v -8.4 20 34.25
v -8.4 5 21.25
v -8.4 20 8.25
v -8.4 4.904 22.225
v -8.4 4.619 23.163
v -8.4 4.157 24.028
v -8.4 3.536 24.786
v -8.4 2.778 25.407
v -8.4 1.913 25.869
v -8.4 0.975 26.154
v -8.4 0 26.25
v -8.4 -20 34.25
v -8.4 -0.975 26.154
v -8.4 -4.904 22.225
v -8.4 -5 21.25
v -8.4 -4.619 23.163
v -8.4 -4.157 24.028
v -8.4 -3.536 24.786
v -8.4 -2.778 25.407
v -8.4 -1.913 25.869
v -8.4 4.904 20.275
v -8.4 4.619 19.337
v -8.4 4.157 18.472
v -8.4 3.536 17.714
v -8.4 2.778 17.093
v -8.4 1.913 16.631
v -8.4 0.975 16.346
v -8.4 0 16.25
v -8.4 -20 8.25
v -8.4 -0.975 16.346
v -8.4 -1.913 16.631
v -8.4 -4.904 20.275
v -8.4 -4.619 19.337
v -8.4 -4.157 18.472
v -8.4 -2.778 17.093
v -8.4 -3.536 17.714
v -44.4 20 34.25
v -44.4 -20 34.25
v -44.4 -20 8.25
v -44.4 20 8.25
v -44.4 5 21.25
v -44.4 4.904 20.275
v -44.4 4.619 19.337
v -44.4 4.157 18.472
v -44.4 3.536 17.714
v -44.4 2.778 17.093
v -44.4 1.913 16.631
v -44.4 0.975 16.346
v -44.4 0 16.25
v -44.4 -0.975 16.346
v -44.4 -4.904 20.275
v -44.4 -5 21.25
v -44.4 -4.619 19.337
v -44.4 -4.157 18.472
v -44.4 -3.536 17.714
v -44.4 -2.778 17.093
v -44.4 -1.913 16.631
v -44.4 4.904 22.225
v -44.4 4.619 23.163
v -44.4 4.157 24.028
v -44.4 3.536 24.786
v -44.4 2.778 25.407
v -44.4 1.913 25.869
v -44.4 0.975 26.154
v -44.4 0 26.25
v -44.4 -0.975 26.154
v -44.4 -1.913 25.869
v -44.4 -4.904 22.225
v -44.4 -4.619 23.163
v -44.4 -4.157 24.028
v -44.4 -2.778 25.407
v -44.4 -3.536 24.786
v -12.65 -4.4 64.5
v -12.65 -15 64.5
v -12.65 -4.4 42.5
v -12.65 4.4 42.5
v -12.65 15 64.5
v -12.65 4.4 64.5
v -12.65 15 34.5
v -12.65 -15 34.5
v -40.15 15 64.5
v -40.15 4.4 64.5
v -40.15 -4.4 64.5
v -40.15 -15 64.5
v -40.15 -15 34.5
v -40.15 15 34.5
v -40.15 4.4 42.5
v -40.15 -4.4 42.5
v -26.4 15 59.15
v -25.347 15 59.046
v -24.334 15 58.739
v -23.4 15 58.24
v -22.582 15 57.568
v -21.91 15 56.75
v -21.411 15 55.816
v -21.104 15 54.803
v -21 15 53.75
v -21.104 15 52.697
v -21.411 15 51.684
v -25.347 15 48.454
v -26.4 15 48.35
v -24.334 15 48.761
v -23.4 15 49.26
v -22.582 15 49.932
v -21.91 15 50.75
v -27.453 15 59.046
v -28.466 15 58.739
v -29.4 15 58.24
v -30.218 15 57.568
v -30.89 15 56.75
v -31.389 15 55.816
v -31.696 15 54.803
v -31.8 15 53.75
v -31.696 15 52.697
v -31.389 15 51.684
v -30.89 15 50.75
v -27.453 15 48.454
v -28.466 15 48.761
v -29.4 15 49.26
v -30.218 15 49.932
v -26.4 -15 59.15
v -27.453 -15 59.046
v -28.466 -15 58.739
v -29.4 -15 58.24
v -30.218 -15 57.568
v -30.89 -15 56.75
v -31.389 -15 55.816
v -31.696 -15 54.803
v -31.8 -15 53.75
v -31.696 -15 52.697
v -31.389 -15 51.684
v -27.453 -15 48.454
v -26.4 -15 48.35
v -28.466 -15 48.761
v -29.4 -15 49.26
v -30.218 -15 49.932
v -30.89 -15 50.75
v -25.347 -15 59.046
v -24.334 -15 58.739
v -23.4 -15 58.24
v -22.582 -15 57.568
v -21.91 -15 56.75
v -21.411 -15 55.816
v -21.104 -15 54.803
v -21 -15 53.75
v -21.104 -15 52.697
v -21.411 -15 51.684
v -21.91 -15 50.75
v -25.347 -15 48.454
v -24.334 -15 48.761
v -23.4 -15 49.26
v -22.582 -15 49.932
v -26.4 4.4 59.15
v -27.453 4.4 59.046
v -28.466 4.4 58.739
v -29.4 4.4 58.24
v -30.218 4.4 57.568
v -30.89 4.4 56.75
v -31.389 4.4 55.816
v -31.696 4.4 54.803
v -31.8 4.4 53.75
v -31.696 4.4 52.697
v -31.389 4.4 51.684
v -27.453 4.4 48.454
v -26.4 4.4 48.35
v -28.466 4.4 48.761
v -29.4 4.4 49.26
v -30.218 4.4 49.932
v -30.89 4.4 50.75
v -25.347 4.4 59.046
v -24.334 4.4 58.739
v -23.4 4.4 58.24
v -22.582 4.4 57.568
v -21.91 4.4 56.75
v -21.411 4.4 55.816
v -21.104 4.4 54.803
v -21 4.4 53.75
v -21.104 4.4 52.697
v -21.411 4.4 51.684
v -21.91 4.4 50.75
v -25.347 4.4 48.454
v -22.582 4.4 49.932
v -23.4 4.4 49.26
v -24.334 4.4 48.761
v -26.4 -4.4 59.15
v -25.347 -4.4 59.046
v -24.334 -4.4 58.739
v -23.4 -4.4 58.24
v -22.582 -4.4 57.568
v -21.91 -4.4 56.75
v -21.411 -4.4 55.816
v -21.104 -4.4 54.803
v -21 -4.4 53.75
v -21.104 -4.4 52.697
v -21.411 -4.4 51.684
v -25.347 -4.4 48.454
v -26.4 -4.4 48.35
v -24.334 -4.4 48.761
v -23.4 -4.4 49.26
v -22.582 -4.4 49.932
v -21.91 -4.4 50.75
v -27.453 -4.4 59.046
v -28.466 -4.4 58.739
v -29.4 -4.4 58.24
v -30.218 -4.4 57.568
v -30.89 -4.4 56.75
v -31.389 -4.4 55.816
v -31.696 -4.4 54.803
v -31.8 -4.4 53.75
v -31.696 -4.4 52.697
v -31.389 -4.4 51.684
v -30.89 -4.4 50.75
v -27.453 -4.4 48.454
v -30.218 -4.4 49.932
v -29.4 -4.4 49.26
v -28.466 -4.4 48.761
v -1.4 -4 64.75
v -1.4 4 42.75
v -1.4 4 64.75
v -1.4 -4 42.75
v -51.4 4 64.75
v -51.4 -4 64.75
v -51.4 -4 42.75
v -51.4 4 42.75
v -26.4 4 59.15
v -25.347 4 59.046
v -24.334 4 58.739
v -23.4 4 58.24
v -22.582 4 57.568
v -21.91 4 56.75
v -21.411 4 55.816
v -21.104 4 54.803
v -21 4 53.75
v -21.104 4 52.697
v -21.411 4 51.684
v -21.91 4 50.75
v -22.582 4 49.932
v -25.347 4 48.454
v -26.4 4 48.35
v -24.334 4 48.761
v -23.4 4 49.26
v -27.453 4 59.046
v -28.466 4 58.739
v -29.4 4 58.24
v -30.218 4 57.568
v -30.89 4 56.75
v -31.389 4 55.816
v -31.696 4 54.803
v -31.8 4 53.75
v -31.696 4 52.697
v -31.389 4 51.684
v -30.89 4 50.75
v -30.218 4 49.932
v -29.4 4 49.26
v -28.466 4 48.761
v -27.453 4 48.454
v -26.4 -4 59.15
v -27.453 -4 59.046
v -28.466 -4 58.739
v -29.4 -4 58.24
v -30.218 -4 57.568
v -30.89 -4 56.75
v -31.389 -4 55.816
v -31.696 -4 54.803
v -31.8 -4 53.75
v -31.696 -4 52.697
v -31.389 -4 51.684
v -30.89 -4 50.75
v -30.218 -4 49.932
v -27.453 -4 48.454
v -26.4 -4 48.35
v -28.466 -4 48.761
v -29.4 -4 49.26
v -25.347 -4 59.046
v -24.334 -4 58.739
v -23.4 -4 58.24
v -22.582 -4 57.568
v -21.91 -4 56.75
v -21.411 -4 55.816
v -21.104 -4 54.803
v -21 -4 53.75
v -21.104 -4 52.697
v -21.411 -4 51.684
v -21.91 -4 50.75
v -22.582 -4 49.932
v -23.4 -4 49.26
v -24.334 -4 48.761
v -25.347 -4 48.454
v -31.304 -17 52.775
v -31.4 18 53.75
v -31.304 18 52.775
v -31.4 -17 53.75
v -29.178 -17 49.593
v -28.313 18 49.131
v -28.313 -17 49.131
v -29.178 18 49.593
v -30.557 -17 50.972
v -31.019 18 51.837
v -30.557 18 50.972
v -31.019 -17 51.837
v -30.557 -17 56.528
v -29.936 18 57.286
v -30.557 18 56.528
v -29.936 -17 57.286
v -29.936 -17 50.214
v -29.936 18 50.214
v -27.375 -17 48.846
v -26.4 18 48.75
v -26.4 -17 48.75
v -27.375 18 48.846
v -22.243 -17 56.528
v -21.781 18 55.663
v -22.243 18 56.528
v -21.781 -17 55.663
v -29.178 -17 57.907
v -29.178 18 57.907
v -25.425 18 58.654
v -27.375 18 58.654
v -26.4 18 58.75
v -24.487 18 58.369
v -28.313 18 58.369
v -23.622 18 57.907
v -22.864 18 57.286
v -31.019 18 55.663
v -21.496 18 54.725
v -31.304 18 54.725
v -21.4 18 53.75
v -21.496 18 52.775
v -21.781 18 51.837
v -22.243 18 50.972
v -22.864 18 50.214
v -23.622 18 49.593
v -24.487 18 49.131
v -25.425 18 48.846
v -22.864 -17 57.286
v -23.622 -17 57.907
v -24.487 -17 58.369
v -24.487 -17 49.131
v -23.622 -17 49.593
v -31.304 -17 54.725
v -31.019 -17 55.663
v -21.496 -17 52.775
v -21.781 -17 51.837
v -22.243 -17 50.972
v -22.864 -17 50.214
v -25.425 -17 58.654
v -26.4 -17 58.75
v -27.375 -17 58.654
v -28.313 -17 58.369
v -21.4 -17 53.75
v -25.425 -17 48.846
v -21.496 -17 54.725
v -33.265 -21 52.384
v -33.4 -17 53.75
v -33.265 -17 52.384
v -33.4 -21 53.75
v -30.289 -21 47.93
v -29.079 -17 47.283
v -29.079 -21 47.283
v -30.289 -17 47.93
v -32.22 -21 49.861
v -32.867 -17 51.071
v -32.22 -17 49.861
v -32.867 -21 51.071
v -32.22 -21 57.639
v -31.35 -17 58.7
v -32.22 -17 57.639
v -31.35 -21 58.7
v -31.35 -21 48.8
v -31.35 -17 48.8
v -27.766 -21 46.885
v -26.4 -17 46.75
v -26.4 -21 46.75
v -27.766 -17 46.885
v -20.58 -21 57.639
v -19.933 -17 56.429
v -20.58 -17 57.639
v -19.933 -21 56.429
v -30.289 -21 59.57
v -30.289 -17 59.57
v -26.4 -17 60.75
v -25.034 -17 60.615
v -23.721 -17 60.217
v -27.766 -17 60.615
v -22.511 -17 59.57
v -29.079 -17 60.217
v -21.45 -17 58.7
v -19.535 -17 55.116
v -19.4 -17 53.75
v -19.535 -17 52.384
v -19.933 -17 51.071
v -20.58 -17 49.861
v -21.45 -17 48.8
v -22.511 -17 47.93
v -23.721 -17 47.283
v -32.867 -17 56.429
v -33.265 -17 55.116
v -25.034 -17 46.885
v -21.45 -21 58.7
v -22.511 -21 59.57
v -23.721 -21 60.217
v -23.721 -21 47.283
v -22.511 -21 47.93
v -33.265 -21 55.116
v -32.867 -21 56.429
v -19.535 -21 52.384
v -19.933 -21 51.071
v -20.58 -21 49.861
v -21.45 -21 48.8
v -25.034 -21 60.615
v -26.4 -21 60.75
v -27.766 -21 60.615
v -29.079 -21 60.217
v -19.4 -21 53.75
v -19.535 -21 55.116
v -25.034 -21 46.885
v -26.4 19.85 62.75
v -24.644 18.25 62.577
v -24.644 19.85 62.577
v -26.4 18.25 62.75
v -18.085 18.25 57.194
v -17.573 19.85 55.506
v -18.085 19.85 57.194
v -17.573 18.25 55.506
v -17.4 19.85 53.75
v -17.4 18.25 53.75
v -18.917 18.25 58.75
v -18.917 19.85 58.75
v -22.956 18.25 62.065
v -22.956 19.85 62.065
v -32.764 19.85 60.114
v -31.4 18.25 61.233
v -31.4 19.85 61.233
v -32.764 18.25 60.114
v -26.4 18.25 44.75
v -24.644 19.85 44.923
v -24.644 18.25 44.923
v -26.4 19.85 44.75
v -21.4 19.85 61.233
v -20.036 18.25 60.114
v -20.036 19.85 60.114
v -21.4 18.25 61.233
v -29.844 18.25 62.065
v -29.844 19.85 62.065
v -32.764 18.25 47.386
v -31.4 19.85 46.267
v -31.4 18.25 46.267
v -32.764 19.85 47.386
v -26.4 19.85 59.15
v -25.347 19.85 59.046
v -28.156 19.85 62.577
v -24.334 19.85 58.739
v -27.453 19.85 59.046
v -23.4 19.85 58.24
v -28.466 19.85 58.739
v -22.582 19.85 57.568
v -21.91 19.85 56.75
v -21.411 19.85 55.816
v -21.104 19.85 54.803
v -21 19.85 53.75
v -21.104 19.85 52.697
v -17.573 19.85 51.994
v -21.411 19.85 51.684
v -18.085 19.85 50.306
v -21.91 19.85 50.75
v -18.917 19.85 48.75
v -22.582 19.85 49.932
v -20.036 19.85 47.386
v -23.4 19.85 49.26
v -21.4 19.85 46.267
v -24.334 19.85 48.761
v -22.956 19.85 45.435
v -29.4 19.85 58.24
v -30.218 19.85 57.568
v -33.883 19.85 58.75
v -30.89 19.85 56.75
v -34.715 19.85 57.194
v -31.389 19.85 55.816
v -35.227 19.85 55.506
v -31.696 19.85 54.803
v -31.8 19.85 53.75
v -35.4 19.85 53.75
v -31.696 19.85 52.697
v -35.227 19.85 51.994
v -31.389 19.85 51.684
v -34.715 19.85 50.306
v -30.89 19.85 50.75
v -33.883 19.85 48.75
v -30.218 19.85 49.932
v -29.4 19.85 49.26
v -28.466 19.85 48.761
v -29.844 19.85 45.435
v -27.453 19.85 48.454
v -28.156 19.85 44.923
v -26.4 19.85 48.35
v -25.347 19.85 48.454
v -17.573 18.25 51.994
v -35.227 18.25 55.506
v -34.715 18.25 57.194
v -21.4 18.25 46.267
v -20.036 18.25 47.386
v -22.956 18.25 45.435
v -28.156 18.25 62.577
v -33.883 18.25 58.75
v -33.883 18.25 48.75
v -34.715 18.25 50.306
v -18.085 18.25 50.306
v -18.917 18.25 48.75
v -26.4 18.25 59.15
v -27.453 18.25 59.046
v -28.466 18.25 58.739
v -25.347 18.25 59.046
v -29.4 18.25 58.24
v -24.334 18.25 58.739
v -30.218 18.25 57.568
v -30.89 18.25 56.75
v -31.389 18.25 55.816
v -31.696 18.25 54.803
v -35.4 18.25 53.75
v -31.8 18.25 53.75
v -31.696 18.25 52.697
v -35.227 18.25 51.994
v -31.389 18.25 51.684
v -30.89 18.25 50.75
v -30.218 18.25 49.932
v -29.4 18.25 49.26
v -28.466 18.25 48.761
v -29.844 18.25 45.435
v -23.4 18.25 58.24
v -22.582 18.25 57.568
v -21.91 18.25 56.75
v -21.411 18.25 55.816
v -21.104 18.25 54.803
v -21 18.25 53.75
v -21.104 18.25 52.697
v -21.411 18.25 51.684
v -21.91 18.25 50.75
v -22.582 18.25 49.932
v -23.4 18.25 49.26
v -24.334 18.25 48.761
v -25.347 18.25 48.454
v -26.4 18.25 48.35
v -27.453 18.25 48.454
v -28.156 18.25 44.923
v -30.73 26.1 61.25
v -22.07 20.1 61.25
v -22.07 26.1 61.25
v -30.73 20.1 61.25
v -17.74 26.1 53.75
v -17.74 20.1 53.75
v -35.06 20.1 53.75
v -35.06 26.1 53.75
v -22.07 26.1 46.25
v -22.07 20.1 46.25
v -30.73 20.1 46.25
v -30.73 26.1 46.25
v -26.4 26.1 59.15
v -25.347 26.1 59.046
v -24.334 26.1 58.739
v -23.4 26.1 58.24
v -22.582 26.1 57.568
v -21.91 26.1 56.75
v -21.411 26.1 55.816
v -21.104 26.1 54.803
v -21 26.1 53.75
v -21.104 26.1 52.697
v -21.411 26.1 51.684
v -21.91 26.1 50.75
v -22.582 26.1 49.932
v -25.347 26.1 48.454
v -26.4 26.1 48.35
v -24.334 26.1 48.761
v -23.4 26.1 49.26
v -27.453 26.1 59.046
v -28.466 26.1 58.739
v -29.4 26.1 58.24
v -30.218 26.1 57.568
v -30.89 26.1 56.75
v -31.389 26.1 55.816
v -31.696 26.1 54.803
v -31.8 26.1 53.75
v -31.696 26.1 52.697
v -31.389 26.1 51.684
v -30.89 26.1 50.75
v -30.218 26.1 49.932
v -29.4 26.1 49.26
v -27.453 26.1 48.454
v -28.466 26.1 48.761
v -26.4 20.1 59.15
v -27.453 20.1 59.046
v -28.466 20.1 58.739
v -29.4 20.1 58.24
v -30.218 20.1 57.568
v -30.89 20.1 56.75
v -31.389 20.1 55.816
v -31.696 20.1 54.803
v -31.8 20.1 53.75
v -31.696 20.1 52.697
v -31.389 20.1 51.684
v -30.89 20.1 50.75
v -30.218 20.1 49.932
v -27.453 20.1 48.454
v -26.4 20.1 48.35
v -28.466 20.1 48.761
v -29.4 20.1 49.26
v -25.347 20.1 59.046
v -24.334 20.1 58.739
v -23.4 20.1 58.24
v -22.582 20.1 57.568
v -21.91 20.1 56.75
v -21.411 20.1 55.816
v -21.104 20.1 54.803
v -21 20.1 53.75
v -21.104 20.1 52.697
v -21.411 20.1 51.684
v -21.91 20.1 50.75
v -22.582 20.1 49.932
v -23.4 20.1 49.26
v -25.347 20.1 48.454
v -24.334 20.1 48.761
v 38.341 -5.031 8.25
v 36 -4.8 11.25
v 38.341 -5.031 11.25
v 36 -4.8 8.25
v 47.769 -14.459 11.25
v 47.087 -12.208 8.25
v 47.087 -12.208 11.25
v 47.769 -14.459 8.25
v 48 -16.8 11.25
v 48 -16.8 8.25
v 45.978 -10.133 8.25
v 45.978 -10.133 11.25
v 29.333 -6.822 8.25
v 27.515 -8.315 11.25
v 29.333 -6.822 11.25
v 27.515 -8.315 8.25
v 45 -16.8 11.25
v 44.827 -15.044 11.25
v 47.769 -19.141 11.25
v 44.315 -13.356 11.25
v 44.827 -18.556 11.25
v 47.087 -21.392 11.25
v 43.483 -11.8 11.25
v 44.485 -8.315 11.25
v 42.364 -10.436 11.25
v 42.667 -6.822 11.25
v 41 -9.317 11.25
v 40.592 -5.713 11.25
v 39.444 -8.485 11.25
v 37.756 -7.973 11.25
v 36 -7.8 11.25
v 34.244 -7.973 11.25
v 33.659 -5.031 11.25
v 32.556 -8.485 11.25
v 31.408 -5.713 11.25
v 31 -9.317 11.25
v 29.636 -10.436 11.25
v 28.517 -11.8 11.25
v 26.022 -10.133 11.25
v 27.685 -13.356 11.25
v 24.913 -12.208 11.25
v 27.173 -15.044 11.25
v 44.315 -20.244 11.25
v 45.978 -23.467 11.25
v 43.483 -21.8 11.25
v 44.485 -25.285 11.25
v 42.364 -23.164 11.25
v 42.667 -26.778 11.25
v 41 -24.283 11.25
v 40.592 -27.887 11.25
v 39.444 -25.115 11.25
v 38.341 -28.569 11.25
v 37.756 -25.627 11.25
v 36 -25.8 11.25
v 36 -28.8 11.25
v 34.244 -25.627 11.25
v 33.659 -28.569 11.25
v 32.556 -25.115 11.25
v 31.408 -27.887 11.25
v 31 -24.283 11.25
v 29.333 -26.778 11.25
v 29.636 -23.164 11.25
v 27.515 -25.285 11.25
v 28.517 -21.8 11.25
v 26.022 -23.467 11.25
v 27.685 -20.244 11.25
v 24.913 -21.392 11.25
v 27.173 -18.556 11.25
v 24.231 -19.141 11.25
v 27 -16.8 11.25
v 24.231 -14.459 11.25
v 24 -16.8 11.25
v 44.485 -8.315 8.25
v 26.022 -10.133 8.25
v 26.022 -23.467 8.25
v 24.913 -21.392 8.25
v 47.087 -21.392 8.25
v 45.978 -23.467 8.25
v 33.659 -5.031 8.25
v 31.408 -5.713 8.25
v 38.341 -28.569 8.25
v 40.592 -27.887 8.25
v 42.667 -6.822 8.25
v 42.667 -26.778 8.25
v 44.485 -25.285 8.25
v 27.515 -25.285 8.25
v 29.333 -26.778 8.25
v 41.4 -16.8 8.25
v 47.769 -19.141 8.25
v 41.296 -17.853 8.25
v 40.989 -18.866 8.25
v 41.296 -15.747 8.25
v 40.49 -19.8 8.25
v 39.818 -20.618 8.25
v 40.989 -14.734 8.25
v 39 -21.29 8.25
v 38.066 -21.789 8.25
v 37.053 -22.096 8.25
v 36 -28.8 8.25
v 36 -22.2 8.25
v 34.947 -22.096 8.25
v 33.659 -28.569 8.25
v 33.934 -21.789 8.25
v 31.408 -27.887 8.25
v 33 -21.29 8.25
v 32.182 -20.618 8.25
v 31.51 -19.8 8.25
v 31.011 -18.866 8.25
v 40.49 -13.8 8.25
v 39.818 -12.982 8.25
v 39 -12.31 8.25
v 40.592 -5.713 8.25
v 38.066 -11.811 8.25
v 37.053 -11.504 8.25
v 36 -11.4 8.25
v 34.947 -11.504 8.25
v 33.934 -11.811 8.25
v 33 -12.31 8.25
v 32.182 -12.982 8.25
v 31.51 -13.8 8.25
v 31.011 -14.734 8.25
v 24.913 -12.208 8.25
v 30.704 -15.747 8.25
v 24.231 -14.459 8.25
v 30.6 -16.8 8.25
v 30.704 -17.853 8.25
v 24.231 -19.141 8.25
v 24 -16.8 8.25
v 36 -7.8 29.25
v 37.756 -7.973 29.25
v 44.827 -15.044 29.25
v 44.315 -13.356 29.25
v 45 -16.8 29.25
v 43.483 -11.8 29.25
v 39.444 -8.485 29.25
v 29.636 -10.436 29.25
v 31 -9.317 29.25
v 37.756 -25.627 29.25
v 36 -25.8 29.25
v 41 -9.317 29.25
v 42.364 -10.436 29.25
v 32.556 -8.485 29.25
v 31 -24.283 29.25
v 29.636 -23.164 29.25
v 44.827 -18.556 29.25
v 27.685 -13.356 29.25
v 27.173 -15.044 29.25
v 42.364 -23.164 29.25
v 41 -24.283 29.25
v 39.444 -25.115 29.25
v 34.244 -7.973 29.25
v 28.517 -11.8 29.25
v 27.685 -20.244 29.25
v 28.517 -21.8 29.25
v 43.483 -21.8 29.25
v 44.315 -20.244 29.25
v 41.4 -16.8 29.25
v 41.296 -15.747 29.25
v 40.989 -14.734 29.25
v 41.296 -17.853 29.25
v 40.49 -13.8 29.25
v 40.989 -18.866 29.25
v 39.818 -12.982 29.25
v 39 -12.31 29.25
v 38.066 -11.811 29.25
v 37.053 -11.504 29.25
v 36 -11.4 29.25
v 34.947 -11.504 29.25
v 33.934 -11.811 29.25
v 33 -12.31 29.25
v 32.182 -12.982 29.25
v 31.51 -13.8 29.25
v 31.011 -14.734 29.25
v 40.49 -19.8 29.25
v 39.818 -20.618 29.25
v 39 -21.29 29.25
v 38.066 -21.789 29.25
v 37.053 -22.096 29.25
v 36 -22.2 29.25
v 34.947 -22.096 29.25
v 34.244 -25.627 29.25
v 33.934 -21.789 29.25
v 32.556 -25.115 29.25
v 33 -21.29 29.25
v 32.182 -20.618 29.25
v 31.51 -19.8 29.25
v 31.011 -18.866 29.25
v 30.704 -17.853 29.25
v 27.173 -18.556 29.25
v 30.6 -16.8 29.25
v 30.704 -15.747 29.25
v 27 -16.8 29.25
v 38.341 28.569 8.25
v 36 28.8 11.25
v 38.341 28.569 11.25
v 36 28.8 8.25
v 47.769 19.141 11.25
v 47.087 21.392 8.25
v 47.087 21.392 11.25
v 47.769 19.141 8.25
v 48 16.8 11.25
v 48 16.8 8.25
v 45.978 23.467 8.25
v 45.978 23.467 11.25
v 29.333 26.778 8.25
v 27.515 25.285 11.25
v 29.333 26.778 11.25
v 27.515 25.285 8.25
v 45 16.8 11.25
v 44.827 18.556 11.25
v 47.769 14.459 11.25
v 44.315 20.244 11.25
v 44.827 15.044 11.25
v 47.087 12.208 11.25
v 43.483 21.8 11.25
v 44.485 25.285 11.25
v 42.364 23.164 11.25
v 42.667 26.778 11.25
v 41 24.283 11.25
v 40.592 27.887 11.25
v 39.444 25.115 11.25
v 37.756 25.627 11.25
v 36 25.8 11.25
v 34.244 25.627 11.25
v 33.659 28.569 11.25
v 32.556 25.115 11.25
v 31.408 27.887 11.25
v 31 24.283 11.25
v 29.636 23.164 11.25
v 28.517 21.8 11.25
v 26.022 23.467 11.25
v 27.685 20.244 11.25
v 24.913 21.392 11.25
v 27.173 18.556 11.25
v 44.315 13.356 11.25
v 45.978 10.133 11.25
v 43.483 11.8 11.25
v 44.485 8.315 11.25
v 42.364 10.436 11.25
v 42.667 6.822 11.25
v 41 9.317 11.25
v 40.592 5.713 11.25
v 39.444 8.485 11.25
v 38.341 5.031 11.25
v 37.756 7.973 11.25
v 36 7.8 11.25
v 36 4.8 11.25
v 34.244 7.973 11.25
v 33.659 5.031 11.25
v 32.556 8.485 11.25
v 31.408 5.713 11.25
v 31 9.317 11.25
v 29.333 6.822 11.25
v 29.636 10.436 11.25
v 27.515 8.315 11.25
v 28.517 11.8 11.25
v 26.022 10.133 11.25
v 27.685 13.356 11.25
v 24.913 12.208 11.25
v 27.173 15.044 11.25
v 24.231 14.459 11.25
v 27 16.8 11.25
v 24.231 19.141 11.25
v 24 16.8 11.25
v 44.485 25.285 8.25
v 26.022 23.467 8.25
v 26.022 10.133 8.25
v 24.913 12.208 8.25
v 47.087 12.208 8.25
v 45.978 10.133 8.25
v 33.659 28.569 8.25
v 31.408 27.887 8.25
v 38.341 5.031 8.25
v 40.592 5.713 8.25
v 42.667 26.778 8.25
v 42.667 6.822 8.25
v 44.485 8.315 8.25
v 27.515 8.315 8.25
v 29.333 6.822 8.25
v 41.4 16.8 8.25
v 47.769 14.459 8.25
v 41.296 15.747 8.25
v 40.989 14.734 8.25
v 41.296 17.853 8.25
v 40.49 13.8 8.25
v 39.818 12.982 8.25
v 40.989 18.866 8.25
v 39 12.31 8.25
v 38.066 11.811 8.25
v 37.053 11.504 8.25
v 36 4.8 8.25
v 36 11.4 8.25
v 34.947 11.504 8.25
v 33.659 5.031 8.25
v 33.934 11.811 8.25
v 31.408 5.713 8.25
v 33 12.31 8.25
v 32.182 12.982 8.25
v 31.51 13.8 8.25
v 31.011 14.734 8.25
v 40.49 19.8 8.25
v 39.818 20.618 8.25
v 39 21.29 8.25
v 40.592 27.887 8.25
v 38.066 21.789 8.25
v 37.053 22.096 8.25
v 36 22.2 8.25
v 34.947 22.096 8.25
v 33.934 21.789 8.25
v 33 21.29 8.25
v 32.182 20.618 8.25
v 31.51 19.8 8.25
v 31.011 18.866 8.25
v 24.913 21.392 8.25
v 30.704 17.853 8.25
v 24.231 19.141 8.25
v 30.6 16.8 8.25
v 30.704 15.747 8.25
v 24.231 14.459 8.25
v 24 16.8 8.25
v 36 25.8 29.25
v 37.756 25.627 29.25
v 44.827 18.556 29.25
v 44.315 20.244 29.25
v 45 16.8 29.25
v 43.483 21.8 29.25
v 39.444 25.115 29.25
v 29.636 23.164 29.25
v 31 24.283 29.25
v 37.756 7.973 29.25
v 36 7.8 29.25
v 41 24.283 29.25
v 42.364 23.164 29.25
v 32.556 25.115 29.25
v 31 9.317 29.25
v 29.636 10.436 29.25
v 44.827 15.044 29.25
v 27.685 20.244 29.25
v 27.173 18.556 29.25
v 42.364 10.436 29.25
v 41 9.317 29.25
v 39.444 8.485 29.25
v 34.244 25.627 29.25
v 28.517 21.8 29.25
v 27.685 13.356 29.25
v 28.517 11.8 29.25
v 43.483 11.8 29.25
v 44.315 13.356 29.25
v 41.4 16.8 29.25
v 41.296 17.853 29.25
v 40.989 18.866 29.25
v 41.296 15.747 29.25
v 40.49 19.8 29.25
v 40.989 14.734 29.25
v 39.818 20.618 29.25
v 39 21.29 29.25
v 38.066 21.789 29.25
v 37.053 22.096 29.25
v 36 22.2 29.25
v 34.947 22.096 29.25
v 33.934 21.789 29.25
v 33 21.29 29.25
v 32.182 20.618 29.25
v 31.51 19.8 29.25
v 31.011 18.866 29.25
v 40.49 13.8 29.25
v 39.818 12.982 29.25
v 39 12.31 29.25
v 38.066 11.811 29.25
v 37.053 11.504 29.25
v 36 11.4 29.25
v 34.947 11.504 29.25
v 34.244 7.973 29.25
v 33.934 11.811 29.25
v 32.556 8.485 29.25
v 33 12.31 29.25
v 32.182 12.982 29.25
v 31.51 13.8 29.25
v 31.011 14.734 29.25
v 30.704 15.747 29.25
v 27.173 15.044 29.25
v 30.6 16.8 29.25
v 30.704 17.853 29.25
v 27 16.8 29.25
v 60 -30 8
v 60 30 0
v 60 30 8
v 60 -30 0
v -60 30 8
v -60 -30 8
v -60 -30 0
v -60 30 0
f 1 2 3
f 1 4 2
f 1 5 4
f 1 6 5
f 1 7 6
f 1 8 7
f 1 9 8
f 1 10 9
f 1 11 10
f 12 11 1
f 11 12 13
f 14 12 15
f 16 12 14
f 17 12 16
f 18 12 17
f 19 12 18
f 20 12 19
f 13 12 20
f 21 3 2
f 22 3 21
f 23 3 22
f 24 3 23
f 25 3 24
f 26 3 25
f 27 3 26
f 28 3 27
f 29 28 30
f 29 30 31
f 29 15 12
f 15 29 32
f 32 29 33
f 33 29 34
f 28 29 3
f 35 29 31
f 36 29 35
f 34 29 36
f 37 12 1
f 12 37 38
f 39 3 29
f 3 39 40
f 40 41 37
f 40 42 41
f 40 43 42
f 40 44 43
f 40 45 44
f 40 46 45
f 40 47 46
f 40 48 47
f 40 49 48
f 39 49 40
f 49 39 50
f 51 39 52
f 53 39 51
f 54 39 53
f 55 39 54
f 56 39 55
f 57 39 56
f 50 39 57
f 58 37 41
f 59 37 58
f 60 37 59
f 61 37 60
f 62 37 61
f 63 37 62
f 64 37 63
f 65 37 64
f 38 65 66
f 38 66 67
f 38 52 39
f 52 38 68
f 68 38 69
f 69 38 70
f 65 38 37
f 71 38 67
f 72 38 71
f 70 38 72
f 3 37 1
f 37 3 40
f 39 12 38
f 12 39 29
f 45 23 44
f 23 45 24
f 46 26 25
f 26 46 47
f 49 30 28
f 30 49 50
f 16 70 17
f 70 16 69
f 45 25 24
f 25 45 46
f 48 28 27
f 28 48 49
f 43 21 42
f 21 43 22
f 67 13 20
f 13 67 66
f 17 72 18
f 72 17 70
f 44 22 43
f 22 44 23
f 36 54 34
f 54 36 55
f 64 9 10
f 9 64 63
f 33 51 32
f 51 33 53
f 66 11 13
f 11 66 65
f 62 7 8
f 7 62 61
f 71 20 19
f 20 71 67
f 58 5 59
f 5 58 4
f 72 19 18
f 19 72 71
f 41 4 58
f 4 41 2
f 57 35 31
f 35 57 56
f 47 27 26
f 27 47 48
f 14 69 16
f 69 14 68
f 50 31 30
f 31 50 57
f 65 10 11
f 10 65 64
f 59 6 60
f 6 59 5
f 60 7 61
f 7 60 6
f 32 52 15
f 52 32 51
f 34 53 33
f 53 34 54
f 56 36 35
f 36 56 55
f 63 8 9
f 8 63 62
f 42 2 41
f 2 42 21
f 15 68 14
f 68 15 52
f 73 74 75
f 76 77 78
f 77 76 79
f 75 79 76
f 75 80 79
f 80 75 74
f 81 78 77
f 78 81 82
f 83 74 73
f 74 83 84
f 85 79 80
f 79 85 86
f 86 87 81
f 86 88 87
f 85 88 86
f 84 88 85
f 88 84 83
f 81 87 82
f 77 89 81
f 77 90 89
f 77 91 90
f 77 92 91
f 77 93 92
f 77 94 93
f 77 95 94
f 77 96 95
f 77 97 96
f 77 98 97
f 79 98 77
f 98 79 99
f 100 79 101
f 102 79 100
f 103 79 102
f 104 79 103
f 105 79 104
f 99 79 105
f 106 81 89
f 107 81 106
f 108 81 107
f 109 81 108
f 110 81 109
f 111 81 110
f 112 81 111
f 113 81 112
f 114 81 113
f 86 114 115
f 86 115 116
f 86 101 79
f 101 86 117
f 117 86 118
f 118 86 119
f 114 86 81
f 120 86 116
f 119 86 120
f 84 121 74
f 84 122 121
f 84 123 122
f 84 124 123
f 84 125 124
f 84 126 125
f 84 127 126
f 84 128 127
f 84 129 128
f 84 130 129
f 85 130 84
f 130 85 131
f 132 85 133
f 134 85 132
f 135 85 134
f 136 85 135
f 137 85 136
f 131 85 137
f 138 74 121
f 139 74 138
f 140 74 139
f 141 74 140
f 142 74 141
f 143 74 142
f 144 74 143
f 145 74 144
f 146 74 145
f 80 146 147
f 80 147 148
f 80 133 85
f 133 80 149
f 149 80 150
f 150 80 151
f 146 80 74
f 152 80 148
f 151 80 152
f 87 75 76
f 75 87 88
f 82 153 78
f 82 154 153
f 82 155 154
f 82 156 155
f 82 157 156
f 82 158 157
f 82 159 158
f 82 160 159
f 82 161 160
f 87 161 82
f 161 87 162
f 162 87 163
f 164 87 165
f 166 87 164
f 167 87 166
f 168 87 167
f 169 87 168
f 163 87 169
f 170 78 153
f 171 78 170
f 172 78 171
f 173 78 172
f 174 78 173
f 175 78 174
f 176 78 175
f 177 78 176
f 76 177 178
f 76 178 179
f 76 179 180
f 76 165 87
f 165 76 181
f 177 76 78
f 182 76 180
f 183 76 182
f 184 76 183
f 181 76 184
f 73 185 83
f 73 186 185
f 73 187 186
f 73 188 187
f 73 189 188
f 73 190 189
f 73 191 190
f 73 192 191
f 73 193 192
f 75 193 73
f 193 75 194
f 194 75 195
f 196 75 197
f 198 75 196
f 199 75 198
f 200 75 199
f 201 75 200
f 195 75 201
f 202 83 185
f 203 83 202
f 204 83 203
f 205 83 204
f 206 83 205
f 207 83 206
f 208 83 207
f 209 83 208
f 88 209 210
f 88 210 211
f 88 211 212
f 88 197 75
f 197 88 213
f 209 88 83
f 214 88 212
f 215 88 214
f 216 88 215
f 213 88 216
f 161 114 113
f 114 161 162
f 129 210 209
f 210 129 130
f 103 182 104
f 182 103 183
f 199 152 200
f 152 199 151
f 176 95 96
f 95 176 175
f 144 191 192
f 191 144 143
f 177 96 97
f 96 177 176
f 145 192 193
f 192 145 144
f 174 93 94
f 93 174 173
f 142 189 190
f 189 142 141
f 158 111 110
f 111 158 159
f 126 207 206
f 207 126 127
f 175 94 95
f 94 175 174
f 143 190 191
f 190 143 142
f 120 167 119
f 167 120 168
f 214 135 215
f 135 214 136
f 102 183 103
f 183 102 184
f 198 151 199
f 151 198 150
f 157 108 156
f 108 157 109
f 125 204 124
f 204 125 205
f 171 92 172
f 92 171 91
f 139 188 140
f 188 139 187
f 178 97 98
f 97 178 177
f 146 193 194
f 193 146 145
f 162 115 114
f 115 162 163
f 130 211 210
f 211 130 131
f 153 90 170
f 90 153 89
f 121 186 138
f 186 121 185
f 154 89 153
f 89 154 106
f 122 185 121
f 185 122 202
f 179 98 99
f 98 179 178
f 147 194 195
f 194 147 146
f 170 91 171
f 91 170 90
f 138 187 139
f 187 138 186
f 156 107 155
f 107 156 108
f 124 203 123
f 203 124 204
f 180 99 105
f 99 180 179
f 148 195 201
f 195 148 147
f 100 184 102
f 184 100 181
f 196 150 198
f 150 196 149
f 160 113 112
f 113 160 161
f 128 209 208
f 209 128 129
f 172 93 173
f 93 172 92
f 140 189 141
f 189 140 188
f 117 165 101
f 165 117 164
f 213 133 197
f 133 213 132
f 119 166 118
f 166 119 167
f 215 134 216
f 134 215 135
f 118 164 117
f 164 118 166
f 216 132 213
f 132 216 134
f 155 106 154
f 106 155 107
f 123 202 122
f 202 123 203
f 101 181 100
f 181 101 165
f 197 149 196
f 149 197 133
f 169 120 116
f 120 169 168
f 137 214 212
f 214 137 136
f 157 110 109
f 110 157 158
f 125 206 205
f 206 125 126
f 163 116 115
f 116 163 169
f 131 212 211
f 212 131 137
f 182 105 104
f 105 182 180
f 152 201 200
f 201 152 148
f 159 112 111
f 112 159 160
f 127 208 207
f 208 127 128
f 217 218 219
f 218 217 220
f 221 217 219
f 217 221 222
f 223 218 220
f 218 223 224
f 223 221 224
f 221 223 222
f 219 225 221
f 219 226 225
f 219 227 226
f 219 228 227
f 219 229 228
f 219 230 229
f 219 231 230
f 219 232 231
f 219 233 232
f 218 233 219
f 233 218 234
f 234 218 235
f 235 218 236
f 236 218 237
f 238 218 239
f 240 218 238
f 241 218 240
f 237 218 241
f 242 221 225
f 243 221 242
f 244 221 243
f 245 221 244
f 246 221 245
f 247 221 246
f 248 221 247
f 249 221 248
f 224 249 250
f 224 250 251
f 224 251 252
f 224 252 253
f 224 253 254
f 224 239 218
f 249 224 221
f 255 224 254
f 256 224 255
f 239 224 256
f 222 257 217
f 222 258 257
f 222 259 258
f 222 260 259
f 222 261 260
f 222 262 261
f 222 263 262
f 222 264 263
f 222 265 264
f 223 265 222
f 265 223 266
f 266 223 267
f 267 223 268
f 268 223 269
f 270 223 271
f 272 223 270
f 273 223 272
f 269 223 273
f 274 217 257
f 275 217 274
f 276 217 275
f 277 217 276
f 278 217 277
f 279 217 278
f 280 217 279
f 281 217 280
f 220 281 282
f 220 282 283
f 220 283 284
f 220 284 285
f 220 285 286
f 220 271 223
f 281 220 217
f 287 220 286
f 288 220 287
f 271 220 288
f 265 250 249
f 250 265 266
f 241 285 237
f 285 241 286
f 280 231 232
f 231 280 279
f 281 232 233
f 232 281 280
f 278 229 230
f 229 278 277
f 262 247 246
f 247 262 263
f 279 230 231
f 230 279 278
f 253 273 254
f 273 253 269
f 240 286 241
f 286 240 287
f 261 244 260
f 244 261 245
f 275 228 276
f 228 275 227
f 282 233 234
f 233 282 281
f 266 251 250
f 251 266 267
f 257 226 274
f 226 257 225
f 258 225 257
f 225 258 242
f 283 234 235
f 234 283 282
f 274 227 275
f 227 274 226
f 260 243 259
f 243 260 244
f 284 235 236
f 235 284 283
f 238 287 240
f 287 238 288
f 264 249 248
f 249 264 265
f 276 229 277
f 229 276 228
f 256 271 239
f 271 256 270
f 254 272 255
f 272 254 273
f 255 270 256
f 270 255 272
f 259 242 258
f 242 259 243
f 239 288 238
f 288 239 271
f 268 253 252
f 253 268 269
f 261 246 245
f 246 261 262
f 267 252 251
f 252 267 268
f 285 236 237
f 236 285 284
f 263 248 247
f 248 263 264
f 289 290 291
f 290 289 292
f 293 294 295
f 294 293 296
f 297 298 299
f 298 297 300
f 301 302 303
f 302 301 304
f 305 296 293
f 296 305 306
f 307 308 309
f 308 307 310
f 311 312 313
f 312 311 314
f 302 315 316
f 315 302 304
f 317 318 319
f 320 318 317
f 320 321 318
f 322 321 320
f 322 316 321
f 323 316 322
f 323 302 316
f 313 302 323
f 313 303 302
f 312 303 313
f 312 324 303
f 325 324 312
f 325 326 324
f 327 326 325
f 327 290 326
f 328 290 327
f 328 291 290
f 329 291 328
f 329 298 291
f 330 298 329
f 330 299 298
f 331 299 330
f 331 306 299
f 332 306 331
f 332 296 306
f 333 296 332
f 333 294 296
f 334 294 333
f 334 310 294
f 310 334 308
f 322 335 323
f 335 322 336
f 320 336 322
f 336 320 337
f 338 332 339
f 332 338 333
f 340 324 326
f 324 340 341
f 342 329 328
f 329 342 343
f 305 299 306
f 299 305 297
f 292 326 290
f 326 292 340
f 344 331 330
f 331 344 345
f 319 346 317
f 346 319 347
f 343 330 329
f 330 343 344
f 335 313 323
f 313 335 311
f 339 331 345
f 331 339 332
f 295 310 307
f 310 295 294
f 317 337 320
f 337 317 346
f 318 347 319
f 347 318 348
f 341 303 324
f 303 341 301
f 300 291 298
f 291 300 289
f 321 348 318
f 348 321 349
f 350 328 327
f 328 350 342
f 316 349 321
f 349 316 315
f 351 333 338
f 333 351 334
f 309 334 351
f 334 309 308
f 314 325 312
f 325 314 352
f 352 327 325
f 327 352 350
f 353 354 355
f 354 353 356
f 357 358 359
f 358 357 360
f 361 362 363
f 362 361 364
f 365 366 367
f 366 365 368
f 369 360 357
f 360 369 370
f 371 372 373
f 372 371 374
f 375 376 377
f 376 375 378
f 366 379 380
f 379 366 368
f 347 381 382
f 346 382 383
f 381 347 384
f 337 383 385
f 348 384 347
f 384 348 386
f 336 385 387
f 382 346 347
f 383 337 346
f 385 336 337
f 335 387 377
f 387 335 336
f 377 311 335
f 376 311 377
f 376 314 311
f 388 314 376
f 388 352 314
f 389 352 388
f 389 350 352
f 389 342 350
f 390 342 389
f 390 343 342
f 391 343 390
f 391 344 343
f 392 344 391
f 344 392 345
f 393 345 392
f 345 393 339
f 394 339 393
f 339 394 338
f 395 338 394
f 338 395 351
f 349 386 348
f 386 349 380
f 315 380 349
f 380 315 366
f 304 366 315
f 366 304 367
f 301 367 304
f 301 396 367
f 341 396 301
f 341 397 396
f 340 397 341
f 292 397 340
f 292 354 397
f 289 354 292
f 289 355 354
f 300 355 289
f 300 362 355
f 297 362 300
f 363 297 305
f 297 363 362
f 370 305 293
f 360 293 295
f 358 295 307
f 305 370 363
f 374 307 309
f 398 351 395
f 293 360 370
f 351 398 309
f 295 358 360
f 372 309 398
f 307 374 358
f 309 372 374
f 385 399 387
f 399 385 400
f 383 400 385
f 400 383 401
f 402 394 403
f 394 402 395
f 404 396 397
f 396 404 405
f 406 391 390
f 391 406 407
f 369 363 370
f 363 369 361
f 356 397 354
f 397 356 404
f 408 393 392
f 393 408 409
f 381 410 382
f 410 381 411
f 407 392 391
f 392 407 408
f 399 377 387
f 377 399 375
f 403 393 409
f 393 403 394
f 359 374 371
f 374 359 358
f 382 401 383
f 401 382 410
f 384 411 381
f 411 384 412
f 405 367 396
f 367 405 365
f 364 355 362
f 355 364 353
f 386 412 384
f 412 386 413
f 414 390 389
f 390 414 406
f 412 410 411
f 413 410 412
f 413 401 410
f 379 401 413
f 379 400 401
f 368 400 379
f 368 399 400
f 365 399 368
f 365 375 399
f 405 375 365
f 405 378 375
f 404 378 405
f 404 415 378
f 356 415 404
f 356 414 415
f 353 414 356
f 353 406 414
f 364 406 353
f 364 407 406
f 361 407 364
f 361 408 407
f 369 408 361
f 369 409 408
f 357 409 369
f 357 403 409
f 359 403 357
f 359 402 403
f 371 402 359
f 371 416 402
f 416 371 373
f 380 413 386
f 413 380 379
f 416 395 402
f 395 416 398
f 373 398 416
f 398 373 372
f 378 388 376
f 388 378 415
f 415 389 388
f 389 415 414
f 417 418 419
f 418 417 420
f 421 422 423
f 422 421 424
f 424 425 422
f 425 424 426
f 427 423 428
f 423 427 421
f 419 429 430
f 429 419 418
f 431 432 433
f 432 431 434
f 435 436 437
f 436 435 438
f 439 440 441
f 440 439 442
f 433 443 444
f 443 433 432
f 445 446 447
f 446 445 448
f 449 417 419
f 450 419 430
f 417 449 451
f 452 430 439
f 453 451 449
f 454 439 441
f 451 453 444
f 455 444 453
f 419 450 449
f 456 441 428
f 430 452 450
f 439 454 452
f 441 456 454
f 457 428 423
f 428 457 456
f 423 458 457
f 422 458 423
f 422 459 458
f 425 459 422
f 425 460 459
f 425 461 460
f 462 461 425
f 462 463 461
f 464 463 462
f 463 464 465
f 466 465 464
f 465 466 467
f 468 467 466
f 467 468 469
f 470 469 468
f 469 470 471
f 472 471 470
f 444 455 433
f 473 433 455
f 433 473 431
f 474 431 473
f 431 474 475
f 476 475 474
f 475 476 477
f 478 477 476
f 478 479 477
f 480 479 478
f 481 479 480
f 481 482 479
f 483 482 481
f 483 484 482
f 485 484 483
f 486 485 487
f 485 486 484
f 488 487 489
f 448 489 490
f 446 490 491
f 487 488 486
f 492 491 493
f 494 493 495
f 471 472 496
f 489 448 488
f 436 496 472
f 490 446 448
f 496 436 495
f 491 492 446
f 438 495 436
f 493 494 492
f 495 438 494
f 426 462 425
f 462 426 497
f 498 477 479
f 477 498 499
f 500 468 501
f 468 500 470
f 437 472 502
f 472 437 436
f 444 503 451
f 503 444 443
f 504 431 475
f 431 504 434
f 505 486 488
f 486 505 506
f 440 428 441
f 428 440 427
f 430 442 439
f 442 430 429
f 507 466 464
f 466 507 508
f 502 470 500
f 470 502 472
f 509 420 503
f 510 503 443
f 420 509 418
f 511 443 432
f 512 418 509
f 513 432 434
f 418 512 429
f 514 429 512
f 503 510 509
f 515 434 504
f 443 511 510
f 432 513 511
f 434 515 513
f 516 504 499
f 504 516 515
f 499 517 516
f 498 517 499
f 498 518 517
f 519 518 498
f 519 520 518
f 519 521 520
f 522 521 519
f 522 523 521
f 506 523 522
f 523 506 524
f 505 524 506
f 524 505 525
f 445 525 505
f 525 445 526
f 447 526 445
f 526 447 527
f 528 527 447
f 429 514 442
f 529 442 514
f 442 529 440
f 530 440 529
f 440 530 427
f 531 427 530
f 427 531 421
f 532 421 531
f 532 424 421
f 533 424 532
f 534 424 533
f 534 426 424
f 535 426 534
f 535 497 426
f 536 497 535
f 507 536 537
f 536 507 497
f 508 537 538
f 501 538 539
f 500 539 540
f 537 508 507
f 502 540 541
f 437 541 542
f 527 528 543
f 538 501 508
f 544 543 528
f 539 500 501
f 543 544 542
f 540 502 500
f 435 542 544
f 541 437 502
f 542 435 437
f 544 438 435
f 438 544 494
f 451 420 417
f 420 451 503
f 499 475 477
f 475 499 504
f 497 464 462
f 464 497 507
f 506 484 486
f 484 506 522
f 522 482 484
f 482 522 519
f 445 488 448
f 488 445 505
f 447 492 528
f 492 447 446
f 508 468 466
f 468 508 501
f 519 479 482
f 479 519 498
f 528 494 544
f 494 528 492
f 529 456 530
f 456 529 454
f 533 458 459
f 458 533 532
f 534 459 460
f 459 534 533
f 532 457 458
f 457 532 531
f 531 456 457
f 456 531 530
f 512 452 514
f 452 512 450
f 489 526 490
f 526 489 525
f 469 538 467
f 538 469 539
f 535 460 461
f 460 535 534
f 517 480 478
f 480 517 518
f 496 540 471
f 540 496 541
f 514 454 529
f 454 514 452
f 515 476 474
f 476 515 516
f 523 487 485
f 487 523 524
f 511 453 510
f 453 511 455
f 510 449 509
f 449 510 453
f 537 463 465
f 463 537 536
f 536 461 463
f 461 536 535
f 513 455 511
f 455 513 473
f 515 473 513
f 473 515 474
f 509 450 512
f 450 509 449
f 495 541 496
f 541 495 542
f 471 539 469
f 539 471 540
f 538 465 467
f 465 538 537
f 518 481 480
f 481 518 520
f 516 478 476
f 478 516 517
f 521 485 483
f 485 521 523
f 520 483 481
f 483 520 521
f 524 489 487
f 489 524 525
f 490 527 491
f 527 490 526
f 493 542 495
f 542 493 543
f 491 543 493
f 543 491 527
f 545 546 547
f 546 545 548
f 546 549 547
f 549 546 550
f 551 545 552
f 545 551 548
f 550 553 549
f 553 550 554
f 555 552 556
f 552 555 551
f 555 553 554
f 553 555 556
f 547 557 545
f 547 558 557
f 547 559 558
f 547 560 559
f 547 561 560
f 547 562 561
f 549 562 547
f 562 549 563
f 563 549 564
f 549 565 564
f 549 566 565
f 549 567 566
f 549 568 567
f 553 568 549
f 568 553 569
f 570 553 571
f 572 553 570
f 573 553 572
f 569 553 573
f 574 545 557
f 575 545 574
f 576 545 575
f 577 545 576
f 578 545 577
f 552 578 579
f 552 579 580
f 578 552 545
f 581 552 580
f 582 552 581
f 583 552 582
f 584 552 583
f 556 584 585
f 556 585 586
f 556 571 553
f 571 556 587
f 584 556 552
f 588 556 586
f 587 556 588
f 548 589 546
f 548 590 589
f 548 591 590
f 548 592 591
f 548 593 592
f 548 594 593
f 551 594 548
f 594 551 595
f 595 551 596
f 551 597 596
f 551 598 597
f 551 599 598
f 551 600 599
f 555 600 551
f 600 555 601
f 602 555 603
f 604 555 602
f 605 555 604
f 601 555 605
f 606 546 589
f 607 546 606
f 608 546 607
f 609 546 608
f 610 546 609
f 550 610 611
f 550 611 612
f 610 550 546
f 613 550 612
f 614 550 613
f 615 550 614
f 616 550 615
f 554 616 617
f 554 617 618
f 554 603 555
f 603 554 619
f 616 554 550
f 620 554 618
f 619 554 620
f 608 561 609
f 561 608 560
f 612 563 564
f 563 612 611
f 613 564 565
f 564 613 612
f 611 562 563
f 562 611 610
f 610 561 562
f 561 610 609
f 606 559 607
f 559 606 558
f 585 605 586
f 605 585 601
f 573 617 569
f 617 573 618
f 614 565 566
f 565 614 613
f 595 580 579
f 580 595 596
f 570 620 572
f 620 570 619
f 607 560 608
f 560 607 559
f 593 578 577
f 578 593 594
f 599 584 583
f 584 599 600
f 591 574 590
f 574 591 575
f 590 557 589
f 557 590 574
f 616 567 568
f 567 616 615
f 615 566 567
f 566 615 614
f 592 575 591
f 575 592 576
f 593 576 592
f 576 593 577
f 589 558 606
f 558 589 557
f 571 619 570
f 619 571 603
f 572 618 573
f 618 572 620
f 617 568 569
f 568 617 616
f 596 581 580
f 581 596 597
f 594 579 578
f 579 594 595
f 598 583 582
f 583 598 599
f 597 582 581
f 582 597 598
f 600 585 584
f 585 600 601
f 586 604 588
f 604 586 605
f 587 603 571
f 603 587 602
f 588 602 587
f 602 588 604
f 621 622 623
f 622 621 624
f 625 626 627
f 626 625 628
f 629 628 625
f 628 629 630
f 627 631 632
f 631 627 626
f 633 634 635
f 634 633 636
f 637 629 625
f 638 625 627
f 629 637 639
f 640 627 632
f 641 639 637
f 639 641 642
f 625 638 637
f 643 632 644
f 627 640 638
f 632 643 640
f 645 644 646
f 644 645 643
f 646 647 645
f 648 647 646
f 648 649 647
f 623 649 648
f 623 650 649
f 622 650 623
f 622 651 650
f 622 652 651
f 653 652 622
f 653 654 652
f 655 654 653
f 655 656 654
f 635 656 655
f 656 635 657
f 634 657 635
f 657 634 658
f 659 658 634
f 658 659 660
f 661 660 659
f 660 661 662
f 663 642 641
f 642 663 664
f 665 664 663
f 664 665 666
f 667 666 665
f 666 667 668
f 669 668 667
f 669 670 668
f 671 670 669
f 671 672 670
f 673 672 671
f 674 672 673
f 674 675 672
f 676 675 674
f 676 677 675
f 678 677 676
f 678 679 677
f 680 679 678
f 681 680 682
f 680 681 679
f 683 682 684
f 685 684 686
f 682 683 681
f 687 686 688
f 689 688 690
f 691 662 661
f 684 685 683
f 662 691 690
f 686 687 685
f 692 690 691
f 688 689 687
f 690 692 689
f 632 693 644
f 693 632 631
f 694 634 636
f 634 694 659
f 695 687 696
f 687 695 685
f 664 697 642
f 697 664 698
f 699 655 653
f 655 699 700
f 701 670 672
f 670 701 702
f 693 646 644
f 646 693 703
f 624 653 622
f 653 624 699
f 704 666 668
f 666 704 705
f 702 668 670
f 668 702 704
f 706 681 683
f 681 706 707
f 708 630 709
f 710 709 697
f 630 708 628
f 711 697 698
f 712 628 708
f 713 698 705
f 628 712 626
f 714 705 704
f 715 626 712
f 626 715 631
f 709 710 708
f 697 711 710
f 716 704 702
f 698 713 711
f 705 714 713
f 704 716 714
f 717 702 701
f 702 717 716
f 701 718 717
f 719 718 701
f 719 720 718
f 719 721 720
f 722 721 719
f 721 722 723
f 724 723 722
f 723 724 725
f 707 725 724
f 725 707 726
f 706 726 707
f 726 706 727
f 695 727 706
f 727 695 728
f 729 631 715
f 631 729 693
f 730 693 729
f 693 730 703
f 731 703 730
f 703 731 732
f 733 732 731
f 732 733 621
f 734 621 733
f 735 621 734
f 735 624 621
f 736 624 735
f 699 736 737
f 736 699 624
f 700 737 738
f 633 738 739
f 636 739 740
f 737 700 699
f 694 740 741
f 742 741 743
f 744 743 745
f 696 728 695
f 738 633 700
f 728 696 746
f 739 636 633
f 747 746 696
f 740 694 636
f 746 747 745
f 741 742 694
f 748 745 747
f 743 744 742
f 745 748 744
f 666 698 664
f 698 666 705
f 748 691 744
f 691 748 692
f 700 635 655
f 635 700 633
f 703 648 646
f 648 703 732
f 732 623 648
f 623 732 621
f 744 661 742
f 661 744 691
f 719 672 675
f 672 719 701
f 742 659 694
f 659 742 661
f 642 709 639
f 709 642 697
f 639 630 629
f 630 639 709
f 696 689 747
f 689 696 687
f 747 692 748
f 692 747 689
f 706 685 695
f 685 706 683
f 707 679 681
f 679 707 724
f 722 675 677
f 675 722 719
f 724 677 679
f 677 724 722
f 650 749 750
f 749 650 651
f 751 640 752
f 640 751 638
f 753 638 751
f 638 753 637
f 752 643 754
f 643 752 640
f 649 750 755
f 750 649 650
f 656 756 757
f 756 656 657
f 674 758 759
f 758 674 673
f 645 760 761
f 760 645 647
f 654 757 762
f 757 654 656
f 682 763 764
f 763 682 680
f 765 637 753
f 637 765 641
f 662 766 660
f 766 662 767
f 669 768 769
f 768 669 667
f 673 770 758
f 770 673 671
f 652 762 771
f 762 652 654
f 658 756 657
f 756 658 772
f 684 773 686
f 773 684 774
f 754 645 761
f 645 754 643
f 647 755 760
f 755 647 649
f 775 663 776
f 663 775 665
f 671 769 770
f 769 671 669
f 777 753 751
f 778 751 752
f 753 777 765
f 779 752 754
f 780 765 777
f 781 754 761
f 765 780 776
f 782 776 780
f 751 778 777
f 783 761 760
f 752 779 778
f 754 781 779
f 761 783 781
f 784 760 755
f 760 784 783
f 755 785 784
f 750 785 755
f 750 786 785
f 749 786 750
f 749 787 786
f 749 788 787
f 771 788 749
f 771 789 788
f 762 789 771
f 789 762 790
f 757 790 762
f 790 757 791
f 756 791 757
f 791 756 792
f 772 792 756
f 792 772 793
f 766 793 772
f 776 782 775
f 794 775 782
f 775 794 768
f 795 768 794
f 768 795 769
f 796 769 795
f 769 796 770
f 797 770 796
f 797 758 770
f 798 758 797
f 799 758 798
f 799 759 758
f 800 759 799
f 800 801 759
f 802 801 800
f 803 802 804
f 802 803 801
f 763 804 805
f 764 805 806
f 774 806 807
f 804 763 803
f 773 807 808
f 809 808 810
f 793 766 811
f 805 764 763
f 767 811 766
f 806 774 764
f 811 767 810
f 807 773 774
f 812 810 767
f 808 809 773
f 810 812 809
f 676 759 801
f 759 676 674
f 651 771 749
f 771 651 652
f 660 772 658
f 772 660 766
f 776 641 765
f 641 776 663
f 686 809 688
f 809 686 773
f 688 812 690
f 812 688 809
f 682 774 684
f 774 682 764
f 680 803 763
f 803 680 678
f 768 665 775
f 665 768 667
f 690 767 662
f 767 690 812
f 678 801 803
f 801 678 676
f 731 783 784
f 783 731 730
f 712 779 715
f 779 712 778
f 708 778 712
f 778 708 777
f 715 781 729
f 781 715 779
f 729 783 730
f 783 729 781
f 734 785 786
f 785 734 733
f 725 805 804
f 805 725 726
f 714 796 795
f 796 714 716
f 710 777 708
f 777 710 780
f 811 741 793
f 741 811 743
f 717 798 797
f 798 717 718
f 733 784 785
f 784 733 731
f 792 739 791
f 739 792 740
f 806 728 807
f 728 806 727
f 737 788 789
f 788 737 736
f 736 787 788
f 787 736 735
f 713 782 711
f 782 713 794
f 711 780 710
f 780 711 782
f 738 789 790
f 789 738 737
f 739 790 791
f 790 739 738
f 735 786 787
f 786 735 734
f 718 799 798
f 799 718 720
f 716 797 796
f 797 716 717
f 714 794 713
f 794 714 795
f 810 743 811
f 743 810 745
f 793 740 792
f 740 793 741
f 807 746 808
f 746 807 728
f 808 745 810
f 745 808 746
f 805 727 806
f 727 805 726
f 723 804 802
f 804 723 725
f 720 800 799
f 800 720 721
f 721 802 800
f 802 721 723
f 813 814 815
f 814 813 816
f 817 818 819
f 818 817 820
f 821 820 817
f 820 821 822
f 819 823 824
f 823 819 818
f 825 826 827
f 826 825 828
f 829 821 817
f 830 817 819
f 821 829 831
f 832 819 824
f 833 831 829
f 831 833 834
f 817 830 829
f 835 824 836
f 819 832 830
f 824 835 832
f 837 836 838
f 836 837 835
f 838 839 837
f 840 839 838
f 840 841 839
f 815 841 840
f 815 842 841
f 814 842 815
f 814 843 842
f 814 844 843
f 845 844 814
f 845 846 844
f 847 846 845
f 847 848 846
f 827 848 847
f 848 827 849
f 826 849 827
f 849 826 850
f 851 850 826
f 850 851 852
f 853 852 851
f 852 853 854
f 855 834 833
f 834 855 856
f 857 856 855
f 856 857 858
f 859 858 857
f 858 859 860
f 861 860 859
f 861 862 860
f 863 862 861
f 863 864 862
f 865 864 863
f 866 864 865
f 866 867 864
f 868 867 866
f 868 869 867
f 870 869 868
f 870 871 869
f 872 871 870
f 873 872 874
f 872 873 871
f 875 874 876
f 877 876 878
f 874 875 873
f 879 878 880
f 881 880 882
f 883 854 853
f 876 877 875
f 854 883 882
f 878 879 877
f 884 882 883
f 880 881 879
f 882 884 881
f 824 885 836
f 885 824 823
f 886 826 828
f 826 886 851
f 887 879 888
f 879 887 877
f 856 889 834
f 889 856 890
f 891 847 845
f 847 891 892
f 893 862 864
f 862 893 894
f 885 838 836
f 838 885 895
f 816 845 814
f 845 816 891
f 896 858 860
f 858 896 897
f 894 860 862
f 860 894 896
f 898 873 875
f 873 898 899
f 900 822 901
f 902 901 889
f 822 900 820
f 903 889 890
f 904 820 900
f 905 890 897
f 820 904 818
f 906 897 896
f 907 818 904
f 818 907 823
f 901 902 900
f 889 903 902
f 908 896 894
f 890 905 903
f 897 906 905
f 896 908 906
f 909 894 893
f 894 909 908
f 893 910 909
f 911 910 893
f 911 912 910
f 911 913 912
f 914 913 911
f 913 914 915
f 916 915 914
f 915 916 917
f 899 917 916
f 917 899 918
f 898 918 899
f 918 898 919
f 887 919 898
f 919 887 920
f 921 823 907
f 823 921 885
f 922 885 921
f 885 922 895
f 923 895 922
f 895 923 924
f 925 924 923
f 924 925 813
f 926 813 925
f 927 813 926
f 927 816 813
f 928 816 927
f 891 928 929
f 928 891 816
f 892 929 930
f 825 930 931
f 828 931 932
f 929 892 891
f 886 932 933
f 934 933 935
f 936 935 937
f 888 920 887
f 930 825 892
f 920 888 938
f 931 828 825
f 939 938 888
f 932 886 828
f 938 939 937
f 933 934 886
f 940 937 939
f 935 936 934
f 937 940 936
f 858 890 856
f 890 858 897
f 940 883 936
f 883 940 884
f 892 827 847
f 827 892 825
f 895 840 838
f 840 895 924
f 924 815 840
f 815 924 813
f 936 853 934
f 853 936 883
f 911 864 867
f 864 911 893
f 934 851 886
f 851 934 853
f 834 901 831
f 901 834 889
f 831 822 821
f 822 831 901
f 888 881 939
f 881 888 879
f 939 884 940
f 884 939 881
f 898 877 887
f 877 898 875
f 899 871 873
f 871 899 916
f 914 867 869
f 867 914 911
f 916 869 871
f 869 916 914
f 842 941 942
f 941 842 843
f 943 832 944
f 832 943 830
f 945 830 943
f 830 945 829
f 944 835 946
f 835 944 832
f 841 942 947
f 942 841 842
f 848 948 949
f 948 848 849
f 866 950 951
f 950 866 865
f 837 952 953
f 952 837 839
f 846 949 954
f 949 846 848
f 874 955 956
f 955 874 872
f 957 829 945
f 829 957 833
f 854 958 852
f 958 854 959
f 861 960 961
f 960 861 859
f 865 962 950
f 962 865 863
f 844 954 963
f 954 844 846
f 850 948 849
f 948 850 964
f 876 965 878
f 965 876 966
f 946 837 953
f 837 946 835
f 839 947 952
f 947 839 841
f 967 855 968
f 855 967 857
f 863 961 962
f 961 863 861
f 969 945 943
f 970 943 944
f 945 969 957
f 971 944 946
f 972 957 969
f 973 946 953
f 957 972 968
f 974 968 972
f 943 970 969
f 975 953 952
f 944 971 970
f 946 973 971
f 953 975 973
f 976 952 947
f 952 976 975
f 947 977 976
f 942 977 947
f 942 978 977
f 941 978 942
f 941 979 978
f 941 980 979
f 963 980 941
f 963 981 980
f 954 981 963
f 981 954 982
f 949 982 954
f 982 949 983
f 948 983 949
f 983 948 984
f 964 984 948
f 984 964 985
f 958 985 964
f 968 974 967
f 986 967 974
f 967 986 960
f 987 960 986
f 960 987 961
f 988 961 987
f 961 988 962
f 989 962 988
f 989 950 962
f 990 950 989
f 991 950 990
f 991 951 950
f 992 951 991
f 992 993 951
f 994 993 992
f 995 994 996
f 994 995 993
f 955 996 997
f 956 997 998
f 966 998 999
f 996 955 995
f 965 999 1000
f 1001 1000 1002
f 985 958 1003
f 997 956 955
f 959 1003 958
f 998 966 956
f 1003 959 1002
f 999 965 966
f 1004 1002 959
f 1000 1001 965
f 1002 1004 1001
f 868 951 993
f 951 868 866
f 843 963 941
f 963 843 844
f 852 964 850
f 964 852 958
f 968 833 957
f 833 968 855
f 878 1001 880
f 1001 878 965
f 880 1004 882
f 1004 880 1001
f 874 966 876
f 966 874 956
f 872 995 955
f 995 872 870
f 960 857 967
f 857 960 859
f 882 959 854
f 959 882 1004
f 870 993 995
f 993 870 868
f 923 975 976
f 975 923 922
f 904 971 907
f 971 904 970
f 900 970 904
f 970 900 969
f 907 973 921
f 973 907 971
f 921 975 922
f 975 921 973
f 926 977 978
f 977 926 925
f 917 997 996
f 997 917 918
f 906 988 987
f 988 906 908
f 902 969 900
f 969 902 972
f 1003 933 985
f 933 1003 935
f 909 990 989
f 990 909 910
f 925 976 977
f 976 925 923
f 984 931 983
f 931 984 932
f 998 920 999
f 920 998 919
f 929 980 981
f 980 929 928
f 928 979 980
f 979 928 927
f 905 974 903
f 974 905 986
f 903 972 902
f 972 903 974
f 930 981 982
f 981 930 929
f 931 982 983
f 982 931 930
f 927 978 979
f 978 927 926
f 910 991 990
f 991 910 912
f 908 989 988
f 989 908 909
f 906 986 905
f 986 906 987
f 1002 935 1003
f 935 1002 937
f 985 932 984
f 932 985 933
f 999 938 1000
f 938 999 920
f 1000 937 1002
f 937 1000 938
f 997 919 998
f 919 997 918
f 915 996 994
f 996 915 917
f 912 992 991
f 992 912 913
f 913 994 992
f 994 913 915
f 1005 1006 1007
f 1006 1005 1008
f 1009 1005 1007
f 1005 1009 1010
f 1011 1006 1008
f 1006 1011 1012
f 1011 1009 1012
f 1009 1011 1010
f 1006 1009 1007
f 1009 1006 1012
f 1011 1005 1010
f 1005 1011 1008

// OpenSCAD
$fn = 32;

// ------------------------------------------------------------------------
// Indexing jig: plate 120 x 60 mm, pin d10
// Every part is its own module, assembly() places every instance.
// ------------------------------------------------------------------------

// --- part 1 ---
module jig_plate() {
  difference() {
    translate([-60, -30, 0]) cube([120, 60, 8]);
  }
}

// --- part 2 ---
module locator_block() {
  difference() {
    translate([-18, -20, 0]) cube([36, 40, 26]);
    translate([0, 0, 13]) rotate([0, 90, 0]) cylinder(h = 38, d = 10, center = true);
  }
}

// --- part 3 ---
module index_fork() {
  difference() {
    translate([-13.75, -15, 0]) cube([27.5, 30, 30]);
    translate([-14.75, -4.4, 8]) cube([29.5, 8.8, 23]);
    translate([0, 0, 19.25]) rotate([90, 0, 0]) cylinder(h = 32, d = 10.8, center = true);
  }
}

// --- part 4 ---
module index_arm() {
  difference() {
    translate([-25, -4, 0]) cube([50, 8, 22]);
    translate([0, 0, 11]) rotate([90, 0, 0]) cylinder(h = 10, d = 10.8, center = true);
  }
}

// --- part 5 ---
module index_pin() {
  rotate([0, 90, 0]) cylinder(h = 36, d = 10, center = true);
  translate([-21, 0, 0]) rotate([0, 90, 0]) cylinder(h = 4, d = 14);
}

// --- part 6 ---
module pin_washer() {
  difference() {
      translate([0, 0, 0]) cylinder(h = 1.6, d = 18);
      translate([0, 0, -1]) cylinder(h = 3.6, d = 10.8);
    }
}

// --- part 7 ---
module lock_nut() {
  difference() {
    linear_extrude(height = 6) polygon(points = [[8.66, 0], [4.33, 7.5], [-4.33, 7.5], [-8.66, 0], [-4.33, -7.5], [4.33, -7.5]]);
    translate([0, 0, -1]) cylinder(h = 8, d = 10.8);
  }
}

// --- part 8 ---
module guide_bush_a() {
  difference() {
    union() {
      cylinder(h = 3, d = 24);
      translate([0, 0, 3]) cylinder(h = 18, d = 18);
    }
    translate([0, 0, -1]) cylinder(h = 23, d = 10.8);
  }
}

// --- part 9 ---
module guide_bush_b() {
  difference() {
    union() {
      cylinder(h = 3, d = 24);
      translate([0, 0, 3]) cylinder(h = 18, d = 18);
    }
    translate([0, 0, -1]) cylinder(h = 23, d = 10.8);
  }
}

// --- assembly ---
module assembly() {
  color([0.80, 0.24, 0.20]) translate([0, 0, 0]) rotate([0, 0, 0]) jig_plate();
  color([0.20, 0.45, 0.75]) translate([-26.4, 0, 8.25]) rotate([0, 0, 0]) locator_block();
  color([0.25, 0.62, 0.32]) translate([-26.4, 0, 34.5]) rotate([0, 0, 0]) index_fork();
  color([0.92, 0.70, 0.18]) translate([-26.4, 0, 42.75]) rotate([0, 0, 0]) index_arm();
  color([0.58, 0.35, 0.70]) translate([-26.4, 0, 53.75]) rotate([0, 0, 90]) index_pin();
  color([0.16, 0.66, 0.66]) translate([-26.4, 19.85, 53.75]) rotate([90, 0, 0]) pin_washer();
  color([0.85, 0.48, 0.18]) translate([-26.4, 26.1, 53.75]) rotate([90, 0, 0]) lock_nut();
  color([0.55, 0.60, 0.65]) translate([36, -16.8, 8.25]) rotate([0, 0, 0]) guide_bush_a();
  color([0.75, 0.30, 0.55]) translate([36, 16.8, 8.25]) rotate([0, 0, 0]) guide_bush_b();
}

assembly();
